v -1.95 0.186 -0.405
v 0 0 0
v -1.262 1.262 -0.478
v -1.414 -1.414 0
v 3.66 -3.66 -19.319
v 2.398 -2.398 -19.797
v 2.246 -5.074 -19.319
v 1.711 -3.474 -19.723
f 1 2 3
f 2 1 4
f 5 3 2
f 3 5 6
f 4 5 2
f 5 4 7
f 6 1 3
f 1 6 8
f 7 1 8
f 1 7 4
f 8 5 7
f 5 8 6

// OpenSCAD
// Generated by generate_scads.py
rotate([15,180,45]) {
  intersection() {
    cube(size=[10,10,25], center=false);
    cylinder(h=20, r=2, center=false);
    cylinder(h=20, r=8, center=false);
  }
}
